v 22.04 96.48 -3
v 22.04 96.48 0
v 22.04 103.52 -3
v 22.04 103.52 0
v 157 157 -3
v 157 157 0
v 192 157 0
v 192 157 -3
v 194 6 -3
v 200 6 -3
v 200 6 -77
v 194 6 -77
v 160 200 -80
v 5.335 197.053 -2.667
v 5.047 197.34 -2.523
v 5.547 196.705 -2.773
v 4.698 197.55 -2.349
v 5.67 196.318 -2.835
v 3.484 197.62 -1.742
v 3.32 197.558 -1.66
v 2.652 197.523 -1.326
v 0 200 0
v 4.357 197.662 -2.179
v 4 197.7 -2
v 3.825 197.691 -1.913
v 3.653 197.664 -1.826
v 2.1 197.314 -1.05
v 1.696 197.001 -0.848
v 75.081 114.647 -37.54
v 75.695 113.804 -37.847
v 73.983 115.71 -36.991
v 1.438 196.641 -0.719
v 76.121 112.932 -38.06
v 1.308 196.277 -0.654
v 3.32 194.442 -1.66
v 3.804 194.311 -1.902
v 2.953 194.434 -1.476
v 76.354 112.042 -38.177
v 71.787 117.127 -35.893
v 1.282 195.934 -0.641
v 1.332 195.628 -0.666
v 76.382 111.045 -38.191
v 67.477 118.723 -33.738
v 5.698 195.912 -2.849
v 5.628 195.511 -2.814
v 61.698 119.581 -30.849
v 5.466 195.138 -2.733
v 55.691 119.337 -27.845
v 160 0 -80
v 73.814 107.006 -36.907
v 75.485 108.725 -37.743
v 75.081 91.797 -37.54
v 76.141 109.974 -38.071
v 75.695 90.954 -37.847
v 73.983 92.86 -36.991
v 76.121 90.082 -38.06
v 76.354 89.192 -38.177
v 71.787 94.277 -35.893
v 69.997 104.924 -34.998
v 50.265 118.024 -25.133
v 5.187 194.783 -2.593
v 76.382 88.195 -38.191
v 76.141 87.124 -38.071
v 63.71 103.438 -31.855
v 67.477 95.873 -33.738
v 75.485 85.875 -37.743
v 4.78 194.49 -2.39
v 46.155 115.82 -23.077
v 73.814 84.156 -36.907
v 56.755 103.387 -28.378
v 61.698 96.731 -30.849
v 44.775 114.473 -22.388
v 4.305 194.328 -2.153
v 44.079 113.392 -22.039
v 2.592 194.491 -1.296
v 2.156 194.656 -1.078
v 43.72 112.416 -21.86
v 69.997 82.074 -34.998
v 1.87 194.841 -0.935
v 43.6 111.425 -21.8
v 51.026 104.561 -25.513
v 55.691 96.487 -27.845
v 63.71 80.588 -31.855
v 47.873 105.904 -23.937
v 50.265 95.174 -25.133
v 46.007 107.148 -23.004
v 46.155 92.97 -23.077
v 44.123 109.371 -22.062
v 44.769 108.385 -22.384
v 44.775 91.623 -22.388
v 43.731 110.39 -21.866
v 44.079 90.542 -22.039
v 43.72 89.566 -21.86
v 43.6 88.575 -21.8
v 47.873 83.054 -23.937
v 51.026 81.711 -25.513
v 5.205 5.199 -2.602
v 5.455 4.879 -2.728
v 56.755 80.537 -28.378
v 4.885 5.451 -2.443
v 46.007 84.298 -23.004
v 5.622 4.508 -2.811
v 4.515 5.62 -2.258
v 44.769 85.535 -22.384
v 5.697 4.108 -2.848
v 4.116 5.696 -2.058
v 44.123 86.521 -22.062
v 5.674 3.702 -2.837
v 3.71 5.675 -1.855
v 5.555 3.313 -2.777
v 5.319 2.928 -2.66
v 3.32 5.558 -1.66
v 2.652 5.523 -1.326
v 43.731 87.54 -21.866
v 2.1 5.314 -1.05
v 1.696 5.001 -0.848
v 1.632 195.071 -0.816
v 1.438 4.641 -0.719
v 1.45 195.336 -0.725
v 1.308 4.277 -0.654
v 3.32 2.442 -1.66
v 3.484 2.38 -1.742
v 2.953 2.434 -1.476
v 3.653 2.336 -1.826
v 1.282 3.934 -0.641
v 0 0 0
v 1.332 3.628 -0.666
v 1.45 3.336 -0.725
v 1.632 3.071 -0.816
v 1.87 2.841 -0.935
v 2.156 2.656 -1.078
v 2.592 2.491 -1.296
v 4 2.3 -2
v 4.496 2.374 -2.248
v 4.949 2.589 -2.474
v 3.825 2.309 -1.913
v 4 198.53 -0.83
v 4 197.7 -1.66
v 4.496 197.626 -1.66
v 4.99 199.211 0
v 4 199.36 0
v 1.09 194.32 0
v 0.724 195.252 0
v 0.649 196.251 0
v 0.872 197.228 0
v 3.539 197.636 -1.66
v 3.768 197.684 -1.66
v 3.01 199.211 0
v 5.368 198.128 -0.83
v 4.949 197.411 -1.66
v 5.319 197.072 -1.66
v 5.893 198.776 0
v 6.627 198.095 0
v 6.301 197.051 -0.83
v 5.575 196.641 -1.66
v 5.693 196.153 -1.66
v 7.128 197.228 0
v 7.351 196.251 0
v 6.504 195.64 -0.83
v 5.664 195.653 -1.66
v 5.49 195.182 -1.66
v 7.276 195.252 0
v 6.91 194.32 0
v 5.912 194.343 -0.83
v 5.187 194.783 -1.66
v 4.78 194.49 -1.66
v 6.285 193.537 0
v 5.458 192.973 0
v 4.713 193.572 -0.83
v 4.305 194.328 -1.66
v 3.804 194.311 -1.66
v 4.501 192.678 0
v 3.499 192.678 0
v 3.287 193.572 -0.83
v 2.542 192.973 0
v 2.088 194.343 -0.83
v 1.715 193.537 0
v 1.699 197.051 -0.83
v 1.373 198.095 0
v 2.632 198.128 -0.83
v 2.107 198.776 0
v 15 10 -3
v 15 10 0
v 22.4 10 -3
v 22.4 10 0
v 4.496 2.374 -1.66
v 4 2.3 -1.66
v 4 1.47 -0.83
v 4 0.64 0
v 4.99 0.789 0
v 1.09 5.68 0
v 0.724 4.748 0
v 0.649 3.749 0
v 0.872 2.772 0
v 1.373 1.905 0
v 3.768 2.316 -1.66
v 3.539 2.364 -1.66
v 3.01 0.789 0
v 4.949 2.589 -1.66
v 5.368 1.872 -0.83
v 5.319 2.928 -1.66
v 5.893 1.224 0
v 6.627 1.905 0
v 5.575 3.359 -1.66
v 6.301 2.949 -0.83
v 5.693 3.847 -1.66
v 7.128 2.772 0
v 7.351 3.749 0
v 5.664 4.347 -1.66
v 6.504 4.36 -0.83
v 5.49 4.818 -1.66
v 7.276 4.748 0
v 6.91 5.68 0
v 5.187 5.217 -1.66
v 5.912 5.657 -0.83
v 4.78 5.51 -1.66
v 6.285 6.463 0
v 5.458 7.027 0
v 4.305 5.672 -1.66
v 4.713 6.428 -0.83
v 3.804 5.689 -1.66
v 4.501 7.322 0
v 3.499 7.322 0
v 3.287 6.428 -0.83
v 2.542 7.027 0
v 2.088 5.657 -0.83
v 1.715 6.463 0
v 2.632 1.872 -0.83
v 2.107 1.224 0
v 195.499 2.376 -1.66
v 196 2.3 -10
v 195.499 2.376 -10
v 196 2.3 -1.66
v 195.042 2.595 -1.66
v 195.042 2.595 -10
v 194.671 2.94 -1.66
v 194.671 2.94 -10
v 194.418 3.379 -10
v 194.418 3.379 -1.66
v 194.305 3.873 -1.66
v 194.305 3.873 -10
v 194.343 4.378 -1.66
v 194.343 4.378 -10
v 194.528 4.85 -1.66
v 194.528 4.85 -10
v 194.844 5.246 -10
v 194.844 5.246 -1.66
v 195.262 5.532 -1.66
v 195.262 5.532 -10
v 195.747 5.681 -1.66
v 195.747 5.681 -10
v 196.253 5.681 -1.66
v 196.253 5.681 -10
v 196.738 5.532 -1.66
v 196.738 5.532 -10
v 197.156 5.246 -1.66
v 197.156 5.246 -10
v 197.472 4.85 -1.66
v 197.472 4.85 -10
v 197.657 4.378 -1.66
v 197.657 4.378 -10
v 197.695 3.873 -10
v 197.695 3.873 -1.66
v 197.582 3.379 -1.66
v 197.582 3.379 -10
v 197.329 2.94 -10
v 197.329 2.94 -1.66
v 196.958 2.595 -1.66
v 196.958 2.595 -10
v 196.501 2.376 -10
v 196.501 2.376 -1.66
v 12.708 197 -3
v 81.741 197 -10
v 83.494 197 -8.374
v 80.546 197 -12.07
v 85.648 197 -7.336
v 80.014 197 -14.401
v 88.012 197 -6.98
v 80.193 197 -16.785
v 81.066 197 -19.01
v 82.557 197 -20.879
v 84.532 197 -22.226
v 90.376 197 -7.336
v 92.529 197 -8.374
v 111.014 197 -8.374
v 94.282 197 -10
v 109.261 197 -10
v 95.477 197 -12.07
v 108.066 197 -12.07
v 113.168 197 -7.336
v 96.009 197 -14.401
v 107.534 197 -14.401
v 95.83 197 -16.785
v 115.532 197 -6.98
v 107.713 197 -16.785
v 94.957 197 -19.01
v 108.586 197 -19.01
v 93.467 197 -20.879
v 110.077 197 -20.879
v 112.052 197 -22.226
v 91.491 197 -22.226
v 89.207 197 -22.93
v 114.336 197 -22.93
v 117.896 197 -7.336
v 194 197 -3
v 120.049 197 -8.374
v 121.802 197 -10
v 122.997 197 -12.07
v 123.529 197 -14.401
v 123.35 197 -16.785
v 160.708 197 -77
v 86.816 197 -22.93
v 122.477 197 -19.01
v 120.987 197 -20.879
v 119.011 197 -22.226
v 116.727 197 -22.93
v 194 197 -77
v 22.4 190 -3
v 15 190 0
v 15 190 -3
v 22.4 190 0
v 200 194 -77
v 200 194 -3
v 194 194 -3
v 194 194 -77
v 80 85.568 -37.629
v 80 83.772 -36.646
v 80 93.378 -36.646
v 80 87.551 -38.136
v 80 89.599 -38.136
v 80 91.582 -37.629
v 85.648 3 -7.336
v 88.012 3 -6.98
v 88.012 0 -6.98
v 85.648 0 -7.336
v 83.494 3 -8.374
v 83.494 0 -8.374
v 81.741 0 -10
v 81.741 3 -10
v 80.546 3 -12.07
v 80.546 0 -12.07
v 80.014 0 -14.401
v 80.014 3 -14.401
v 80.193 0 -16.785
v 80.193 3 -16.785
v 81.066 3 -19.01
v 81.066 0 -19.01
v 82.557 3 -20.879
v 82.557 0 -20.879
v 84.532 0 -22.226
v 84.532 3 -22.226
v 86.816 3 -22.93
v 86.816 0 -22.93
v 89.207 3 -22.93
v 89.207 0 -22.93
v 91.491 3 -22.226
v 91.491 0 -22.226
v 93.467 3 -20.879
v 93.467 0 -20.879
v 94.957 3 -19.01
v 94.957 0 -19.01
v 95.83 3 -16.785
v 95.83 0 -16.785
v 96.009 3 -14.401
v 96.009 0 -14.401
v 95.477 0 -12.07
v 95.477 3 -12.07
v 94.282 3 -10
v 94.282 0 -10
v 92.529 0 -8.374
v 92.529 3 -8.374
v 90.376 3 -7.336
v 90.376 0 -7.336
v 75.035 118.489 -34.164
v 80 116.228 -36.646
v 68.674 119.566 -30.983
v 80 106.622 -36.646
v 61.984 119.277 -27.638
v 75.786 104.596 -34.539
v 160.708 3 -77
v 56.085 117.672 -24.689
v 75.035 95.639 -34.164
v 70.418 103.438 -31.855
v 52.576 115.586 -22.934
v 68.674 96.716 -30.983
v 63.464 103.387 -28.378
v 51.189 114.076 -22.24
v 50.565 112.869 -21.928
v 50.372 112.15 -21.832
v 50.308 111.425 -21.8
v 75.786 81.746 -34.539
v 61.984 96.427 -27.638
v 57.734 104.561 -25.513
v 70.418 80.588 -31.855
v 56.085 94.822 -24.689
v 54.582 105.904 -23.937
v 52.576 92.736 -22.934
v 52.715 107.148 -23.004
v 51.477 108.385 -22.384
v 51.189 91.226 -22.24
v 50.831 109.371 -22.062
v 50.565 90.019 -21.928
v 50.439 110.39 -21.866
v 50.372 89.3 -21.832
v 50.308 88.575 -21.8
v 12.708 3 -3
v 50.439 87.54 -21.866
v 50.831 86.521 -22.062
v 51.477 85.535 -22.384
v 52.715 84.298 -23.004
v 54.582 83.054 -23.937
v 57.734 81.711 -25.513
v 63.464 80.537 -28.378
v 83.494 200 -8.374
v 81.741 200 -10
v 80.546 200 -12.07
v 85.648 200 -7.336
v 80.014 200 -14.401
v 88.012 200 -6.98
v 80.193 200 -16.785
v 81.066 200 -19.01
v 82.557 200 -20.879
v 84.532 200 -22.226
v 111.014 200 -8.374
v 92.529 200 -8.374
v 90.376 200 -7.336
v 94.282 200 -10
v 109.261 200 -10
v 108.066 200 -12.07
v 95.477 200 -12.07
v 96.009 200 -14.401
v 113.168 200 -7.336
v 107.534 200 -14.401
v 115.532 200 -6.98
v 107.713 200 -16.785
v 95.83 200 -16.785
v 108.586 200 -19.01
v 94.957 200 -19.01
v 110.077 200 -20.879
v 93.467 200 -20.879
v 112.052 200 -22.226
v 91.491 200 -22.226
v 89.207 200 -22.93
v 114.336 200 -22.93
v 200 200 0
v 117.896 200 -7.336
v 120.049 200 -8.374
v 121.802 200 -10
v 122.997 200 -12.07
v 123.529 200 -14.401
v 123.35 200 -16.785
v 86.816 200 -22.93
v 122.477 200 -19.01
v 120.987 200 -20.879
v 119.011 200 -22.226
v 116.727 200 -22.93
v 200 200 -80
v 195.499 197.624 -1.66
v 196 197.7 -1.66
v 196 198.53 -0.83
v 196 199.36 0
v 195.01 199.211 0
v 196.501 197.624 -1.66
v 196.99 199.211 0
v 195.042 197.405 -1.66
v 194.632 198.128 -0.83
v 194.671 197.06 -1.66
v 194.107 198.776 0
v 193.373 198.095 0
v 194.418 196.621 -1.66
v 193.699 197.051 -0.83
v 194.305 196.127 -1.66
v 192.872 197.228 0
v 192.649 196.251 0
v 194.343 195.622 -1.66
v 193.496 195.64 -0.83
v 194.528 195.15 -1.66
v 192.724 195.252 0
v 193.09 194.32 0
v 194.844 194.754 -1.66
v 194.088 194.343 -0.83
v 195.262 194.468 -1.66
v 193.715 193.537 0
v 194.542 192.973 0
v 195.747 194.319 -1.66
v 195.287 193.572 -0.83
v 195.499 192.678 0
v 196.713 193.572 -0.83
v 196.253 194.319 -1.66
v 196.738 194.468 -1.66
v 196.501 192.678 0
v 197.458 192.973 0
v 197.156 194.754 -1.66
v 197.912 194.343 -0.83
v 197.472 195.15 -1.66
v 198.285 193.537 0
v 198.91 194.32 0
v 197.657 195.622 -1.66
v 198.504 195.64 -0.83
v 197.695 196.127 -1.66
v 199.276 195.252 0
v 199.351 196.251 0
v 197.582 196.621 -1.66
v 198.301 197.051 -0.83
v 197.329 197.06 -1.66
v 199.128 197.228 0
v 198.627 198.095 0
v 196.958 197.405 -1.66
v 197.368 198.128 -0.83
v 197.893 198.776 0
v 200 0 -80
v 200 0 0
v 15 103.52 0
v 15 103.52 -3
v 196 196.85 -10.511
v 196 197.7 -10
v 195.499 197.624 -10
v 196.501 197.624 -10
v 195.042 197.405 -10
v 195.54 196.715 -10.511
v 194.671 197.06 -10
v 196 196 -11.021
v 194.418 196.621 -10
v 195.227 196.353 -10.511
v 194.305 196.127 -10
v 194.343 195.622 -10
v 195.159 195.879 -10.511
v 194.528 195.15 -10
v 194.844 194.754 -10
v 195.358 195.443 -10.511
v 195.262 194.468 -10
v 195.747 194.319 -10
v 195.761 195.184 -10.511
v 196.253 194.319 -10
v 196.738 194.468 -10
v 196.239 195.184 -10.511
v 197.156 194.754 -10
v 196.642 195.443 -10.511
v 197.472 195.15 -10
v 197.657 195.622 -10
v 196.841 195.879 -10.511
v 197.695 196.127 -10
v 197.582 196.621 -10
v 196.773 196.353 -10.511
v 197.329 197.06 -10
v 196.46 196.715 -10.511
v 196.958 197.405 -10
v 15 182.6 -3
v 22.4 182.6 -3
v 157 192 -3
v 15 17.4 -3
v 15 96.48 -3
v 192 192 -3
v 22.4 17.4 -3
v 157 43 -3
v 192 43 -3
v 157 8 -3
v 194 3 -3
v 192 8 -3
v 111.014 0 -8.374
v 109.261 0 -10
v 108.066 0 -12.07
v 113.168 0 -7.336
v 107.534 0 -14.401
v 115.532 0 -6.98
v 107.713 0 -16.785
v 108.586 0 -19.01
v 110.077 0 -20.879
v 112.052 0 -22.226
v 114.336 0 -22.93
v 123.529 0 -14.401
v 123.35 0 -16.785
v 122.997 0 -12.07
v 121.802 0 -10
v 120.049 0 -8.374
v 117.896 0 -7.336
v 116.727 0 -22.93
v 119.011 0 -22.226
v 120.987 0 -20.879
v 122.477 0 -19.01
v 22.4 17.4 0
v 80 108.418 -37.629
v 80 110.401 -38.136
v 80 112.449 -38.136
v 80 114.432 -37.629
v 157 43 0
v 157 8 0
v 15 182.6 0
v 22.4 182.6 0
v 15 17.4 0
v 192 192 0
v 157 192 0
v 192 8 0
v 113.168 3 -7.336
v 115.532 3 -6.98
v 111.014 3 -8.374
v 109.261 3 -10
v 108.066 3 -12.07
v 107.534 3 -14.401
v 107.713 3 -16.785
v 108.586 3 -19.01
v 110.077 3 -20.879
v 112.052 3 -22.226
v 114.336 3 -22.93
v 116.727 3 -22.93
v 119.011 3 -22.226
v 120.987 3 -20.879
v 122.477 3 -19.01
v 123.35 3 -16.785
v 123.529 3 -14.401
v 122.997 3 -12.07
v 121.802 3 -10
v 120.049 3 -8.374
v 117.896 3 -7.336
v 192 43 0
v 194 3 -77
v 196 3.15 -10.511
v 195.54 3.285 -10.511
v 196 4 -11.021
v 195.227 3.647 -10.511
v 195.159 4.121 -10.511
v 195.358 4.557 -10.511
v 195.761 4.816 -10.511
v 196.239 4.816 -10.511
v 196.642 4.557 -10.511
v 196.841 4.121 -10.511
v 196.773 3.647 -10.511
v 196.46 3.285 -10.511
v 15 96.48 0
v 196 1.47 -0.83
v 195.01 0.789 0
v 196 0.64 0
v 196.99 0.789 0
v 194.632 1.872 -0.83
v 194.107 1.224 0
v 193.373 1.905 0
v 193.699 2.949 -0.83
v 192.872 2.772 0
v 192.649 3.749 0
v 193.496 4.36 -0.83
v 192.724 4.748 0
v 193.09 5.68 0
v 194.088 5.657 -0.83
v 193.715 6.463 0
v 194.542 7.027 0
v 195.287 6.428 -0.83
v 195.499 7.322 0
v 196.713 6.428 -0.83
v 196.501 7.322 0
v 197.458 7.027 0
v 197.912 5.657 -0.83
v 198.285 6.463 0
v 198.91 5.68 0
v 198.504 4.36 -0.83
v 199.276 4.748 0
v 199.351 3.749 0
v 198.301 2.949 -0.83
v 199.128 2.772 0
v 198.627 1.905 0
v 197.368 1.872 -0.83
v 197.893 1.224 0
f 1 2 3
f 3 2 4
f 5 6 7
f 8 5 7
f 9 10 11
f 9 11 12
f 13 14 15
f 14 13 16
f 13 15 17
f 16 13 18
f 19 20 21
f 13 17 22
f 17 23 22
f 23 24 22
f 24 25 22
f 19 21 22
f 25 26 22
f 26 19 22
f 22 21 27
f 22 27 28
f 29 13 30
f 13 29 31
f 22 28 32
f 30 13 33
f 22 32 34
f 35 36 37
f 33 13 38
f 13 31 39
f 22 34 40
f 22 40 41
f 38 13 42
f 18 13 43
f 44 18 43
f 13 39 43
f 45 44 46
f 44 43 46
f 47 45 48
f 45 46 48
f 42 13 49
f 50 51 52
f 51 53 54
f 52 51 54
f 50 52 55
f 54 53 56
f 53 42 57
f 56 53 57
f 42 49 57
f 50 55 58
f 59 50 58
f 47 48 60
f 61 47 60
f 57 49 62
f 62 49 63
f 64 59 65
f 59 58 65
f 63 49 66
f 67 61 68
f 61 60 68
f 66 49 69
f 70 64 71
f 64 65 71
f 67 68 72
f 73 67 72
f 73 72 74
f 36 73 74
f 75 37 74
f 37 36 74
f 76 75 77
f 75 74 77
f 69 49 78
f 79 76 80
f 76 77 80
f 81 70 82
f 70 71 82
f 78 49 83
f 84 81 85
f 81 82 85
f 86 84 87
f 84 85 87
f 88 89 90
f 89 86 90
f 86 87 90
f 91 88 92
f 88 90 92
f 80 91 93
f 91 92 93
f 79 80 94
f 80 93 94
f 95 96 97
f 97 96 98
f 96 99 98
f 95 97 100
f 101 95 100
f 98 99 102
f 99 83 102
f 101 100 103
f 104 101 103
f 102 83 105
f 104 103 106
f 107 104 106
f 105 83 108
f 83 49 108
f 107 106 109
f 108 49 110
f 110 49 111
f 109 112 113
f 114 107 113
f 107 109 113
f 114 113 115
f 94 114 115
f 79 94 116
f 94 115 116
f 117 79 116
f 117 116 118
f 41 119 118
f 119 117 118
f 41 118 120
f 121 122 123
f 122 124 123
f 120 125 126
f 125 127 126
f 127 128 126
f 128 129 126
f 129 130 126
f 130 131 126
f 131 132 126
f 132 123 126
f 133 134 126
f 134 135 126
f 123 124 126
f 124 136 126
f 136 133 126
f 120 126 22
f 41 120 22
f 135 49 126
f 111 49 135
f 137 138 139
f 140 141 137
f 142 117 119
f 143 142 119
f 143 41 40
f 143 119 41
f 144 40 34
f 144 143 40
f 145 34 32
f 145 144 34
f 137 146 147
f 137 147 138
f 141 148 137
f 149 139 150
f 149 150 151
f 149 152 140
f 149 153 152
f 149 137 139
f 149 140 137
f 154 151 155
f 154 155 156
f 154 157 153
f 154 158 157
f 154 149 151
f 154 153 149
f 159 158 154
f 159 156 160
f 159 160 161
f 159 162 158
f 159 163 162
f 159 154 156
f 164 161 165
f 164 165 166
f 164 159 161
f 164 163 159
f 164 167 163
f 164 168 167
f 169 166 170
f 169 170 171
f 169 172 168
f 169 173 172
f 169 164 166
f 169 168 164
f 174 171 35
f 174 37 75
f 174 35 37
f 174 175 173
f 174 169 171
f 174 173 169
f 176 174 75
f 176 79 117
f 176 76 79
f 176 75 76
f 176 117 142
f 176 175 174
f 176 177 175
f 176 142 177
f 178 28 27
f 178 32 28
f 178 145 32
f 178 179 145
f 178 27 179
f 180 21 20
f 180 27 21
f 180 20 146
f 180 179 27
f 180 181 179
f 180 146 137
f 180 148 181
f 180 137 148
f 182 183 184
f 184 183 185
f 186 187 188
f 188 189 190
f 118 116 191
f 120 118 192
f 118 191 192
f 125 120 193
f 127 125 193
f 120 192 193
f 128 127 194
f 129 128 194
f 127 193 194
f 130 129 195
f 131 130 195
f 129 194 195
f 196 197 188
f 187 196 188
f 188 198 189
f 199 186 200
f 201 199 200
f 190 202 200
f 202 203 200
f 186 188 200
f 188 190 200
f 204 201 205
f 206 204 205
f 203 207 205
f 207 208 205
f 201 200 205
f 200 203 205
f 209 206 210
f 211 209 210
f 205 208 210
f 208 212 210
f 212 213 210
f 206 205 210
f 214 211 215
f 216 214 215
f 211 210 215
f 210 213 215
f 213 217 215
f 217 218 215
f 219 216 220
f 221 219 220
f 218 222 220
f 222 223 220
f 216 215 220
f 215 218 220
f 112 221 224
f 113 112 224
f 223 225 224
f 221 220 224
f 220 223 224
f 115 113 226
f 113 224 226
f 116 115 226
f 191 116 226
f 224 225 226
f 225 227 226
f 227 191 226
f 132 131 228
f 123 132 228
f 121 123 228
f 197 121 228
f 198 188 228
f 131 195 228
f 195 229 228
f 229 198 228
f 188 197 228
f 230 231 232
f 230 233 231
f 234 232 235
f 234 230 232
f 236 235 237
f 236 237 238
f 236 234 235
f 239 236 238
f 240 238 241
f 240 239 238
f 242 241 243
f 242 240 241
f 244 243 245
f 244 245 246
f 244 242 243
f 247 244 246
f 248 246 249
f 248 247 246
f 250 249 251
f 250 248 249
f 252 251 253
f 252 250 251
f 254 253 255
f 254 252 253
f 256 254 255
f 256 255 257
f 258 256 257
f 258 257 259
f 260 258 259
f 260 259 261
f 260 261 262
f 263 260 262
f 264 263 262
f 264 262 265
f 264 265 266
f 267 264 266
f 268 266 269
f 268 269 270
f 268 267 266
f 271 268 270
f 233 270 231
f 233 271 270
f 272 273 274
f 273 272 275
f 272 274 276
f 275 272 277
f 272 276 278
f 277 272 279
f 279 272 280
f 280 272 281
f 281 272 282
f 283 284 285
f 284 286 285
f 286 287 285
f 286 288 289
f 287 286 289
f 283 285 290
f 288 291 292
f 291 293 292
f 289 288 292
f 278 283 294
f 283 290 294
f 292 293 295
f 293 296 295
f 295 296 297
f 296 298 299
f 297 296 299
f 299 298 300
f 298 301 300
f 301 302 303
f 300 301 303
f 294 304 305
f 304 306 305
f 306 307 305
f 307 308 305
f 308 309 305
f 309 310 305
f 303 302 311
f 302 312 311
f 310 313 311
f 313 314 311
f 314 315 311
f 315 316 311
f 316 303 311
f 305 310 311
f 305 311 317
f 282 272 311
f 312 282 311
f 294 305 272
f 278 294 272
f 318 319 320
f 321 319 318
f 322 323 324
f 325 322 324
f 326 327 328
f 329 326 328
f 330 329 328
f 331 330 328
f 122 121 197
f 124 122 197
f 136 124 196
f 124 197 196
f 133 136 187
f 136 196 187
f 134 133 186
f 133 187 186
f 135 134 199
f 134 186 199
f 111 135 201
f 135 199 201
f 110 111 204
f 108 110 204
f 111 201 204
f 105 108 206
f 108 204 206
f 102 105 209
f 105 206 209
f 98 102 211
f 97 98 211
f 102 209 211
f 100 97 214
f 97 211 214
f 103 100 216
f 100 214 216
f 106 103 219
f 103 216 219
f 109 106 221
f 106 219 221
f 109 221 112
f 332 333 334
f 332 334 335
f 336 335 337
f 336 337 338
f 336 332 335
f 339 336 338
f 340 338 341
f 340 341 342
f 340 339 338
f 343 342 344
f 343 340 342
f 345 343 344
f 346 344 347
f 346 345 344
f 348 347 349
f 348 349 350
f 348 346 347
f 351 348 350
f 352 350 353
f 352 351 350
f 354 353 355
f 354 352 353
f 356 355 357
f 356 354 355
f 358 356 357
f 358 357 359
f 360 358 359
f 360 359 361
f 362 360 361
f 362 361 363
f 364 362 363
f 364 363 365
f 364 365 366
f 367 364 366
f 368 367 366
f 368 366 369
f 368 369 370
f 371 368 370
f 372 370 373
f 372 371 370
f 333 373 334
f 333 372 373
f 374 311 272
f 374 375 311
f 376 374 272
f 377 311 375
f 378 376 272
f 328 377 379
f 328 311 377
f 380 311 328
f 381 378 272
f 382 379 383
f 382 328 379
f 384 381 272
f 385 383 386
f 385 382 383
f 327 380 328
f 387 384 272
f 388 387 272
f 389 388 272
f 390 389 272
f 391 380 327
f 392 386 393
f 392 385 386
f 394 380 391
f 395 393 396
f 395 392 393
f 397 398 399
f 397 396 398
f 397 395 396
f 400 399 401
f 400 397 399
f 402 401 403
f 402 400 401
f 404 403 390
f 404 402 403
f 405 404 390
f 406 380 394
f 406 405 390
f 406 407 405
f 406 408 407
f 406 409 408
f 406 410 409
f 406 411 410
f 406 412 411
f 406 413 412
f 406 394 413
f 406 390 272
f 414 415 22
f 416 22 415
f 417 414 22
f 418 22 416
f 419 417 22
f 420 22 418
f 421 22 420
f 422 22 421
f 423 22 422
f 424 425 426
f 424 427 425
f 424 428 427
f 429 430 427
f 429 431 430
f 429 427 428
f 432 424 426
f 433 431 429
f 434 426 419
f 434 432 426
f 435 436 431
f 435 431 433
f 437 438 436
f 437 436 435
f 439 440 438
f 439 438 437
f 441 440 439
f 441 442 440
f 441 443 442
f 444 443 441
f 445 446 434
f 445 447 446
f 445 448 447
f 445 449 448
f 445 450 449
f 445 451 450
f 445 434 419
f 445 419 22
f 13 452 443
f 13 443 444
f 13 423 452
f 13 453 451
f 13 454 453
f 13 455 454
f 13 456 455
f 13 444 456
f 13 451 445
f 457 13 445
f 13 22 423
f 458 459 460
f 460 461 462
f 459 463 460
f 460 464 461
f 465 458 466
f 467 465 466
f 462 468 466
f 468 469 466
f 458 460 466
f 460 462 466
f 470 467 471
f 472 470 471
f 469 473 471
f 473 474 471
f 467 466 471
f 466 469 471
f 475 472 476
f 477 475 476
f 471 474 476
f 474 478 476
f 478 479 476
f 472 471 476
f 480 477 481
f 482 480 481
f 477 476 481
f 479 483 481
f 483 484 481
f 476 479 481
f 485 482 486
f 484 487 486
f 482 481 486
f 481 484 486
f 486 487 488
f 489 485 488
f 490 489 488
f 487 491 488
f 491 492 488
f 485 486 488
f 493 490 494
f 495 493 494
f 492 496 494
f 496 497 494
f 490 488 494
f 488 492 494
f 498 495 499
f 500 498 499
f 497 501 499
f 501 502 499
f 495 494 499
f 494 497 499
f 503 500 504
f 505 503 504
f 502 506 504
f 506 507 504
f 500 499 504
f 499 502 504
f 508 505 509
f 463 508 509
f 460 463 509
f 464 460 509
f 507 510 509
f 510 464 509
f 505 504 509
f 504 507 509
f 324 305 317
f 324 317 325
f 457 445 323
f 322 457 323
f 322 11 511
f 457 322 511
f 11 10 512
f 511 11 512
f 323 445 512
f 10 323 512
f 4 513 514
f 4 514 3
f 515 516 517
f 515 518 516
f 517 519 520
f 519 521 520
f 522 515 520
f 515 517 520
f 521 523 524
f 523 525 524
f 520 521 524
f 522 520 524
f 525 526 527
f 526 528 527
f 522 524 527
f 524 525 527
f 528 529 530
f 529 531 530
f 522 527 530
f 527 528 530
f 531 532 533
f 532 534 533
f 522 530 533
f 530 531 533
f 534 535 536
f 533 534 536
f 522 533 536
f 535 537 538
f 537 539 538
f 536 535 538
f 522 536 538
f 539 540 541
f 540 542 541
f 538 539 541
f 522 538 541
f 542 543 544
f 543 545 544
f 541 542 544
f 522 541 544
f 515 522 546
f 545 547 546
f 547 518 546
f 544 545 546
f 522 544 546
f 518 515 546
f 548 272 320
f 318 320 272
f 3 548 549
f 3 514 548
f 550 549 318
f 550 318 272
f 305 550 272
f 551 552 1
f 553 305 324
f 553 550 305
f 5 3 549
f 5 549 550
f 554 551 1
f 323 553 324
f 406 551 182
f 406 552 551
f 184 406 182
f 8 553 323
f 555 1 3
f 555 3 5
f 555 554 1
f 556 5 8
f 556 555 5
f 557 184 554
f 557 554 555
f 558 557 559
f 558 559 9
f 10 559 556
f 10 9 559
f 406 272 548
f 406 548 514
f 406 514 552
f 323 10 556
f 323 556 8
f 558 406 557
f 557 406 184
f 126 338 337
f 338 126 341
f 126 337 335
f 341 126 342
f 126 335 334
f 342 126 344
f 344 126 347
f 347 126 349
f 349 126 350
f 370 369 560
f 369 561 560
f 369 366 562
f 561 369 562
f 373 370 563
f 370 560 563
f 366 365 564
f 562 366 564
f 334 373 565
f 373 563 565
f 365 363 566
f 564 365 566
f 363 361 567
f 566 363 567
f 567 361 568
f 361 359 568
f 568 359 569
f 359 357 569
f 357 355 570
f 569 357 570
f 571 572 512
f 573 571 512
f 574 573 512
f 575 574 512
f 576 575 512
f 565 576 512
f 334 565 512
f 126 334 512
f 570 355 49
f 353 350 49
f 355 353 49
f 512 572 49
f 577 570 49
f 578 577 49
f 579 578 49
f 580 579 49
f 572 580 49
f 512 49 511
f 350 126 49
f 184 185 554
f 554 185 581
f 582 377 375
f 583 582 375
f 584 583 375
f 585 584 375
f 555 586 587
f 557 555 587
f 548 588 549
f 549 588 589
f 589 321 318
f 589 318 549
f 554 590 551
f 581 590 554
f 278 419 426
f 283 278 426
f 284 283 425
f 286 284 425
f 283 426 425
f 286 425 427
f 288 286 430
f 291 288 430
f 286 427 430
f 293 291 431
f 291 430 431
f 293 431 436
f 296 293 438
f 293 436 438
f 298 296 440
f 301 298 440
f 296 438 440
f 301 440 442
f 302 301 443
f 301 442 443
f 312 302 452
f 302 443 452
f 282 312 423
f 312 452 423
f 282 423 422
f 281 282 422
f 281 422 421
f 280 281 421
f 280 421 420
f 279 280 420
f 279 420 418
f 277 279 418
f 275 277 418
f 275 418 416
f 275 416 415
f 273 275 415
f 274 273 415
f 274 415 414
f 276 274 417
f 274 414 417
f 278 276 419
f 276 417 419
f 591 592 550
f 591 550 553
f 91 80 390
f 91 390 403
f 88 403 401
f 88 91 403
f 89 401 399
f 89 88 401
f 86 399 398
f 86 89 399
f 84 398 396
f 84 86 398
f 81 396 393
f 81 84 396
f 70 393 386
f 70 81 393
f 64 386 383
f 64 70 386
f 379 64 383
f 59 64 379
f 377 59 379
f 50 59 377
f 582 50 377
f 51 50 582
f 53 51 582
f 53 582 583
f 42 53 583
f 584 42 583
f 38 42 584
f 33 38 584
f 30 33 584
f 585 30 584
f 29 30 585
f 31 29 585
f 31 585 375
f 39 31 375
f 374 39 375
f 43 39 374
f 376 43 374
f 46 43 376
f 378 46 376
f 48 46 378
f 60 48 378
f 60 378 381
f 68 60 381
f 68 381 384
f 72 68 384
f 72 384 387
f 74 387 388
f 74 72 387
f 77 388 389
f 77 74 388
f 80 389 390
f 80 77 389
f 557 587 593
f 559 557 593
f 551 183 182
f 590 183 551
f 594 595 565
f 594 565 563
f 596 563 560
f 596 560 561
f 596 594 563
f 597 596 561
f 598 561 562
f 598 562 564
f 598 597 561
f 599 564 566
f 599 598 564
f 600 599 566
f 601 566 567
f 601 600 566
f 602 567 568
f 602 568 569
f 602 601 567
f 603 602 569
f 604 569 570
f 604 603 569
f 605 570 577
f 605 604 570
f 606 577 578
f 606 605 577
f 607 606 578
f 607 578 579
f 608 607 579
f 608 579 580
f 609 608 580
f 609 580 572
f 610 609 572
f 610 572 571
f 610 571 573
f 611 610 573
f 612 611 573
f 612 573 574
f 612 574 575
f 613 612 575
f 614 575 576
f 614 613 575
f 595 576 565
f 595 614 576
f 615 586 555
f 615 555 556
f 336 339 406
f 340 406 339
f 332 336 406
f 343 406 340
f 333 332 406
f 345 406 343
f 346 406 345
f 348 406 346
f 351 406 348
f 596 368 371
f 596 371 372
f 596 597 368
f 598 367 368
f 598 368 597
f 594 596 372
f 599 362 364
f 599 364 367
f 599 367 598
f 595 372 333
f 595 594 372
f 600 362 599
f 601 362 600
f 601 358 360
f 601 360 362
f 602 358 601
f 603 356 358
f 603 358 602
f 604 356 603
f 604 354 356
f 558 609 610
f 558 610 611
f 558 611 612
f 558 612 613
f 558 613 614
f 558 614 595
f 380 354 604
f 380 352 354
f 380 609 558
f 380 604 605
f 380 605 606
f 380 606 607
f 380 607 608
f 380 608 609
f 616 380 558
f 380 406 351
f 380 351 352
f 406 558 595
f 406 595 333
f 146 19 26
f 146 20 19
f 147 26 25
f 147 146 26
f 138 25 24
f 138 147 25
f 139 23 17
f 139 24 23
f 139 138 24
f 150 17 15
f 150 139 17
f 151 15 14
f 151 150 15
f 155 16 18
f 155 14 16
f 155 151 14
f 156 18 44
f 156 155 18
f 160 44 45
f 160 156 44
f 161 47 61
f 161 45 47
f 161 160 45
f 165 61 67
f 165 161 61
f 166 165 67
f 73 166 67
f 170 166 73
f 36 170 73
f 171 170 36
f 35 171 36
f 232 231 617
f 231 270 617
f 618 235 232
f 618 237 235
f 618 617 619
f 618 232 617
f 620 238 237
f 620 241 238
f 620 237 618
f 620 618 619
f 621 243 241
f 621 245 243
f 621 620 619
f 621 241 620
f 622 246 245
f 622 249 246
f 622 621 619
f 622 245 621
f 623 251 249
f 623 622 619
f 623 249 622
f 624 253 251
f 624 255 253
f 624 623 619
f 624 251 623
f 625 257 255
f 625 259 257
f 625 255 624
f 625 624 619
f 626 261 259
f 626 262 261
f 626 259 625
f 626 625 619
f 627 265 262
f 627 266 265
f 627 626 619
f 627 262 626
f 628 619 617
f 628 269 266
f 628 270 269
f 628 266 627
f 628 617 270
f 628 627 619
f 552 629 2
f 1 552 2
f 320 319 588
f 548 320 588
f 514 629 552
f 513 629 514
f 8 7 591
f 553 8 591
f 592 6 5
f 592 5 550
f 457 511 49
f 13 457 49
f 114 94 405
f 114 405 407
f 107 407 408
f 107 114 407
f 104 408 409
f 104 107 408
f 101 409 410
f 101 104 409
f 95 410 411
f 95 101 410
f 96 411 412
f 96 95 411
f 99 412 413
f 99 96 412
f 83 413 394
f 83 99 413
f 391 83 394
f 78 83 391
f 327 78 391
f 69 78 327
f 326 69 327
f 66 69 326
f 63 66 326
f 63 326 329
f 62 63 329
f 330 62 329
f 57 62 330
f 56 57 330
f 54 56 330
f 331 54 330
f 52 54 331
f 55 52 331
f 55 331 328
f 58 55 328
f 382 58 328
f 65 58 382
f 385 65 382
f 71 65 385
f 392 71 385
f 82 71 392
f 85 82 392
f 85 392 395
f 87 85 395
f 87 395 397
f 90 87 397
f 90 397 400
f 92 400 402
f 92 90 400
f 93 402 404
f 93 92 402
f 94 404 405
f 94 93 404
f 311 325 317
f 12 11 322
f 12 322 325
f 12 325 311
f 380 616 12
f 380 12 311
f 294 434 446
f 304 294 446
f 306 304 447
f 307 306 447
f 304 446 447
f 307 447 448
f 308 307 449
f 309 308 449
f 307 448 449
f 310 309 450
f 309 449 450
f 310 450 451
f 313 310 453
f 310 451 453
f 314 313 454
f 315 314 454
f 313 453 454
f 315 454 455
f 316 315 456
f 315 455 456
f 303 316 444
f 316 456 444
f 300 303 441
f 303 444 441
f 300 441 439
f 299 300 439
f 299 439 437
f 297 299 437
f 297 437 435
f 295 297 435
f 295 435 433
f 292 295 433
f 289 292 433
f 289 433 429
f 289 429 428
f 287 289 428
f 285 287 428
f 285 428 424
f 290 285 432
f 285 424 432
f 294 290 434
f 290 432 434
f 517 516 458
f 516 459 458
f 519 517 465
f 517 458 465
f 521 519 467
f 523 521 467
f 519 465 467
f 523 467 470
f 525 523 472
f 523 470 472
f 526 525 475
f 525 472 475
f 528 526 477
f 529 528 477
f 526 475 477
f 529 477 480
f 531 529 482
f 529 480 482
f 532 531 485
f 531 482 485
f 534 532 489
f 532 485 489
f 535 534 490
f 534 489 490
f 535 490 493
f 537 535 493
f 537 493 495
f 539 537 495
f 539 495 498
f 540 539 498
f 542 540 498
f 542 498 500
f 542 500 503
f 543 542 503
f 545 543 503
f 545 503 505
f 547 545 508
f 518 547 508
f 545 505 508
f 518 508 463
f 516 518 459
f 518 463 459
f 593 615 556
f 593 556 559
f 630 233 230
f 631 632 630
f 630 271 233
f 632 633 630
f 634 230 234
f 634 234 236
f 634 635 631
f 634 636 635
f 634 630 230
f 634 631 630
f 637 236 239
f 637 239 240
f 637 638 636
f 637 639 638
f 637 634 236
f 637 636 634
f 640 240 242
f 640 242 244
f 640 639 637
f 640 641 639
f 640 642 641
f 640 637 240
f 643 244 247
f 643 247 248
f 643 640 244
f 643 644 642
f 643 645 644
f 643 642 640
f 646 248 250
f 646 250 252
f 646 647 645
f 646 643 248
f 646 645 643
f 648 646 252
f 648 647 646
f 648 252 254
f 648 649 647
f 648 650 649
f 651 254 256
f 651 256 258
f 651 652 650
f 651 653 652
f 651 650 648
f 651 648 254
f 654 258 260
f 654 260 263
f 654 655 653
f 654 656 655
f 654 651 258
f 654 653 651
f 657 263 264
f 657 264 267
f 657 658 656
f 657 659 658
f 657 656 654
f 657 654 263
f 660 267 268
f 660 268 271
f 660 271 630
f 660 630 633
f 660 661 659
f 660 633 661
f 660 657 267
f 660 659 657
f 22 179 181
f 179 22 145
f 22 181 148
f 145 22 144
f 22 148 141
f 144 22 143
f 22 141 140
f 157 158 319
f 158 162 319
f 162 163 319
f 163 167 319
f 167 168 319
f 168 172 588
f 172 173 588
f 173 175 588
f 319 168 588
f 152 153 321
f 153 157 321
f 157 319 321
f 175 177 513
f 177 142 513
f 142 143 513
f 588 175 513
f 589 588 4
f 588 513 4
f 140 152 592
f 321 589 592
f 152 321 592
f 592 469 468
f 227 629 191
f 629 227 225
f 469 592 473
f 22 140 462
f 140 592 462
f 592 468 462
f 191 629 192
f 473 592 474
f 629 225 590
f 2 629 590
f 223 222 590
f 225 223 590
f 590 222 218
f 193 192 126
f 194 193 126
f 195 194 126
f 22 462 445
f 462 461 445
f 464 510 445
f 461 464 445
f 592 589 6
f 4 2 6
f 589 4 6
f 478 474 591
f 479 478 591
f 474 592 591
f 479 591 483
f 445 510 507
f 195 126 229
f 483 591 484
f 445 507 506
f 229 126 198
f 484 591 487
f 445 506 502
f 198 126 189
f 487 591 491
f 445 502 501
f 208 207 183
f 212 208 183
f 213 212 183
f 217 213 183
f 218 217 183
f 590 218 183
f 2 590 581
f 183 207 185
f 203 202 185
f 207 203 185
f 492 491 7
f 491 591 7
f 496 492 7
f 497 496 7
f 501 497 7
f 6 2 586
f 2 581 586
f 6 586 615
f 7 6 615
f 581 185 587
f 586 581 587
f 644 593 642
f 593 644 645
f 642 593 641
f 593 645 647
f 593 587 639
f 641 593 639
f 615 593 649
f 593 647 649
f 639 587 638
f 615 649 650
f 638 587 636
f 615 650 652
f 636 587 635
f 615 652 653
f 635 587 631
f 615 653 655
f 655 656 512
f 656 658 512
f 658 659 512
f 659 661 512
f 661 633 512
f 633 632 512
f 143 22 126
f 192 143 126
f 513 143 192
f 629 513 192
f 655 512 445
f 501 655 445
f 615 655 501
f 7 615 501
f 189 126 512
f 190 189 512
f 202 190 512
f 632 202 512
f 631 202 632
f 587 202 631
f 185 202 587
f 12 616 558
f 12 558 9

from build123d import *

# Parameters (mm, degrees)
SALIENTE_EXTRUIR2_DEPTH = 200
VACIADO2_T              = -3
CROQUIS6_R              = 8.2
CORTAR_EXTRUIR4_DEPTH   = 80
CROQUIS2_R              = 8.02
CORTAR_EXTRUIR5_DEPTH   = 3
CORTAR_EXTRUIR6_START   = -3
CROQUIS5_R              = 8.02
CORTAR_EXTRUIR6_DEPTH   = 3
CROQUIS7_W              = 7.4
CROQUIS7_H              = 7.4
CORTAR_EXTRUIR11_DEPTH  = 3
CROQUIS8_W              = 7.04
CROQUIS8_H              = 7.04
CORTAR_EXTRUIR12_DEPTH  = 3
CROQUIS9_W              = 35
CROQUIS9_H              = 35
CORTAR_EXTRUIR13_DEPTH  = 3
CROQUIS15_W             = 6
CROQUIS15_H             = 3
SALIENTE_EXTRUIR3_DEPTH = 75


with BuildPart() as part:
    # Croquis1 → Saliente-Extruir2 (new body)
    with BuildSketch(Plane(origin=(0, 0, 0), x_dir=(1, 0, 0), z_dir=(0, 1, 0))):
        Polygon((0, 0), (200, 0), (200, 80), (160, 80), align=None)
    extrude(amount=SALIENTE_EXTRUIR2_DEPTH)

    # Vaciado2
    vaciado2_openings = [part.faces().sort_by_distance(p)[0] for p in [
        (200, 100, -40),
    ]]
    offset(amount=VACIADO2_T, openings=vaciado2_openings, kind=Kind.INTERSECTION)

    # Croquis6 → Cortar-Extruir4 (cut)
    with BuildSketch(Plane(origin=(0, 0, 0), x_dir=(0, 0, -1), z_dir=(1, 0, 0))):
        with Locations(Location((30, 88.575, 0), (0, 0, 180))):
            Circle(CROQUIS6_R)
        with Locations(Location((30, 111.425, 0), (0, 0, 180))):
            Circle(CROQUIS6_R)
    extrude(amount=CORTAR_EXTRUIR4_DEPTH, mode=Mode.SUBTRACT)

    # Croquis2 → Cortar-Extruir5 (cut)
    with BuildSketch(Plane(origin=(0, 200, 0), x_dir=(1, 0, 0), z_dir=(0, 1, 0))):
        with Locations(Location((88.011571484, 15, 0), (0, 0, 270))):
            Circle(CROQUIS2_R)
        with Locations(Location((115.531571484, 15, 0), (0, 0, 270))):
            Circle(CROQUIS2_R)
    extrude(amount=-CORTAR_EXTRUIR5_DEPTH, mode=Mode.SUBTRACT)

    # Croquis5 → Cortar-Extruir6 (cut)
    with BuildSketch(Plane.XZ.offset(CORTAR_EXTRUIR6_START)):
        with Locations(Location((88.011571484, -15, 0), (0, 0, 90))):
            Circle(CROQUIS5_R)
        with Locations(Location((115.531571484, -15, 0), (0, 0, 90))):
            Circle(CROQUIS5_R)
    extrude(amount=CORTAR_EXTRUIR6_DEPTH, mode=Mode.SUBTRACT)

    # Croquis7 → Cortar-Extruir11 (cut)
    with BuildSketch(Plane.XY):
        with Locations((18.7, 13.7)):
            Rectangle(CROQUIS7_W, CROQUIS7_H)
    cortar_extruir11 = extrude(amount=-CORTAR_EXTRUIR11_DEPTH, mode=Mode.SUBTRACT)

    # Simetría5: Cortar-Extruir11 across plane
    add(cortar_extruir11.mirror(Plane.ZX.offset(100)), mode=Mode.SUBTRACT)

    # Croquis8 → Cortar-Extruir12 (cut)
    with BuildSketch(Plane.XY):
        with Locations((18.52, 100)):
            Rectangle(CROQUIS8_W, CROQUIS8_H)
    extrude(amount=-CORTAR_EXTRUIR12_DEPTH, mode=Mode.SUBTRACT)

    # Croquis9 → Cortar-Extruir13 (cut)
    with BuildSketch(Plane.XY):
        with Locations((174.5, 174.5)):
            Rectangle(CROQUIS9_W, CROQUIS9_H)
    cortar_extruir13 = extrude(amount=-CORTAR_EXTRUIR13_DEPTH, mode=Mode.SUBTRACT)

    # Simetría6: Cortar-Extruir13 across plane
    add(cortar_extruir13.mirror(Plane.ZX.offset(100)), mode=Mode.SUBTRACT)

    # Croquis15 → Saliente-Extruir3 (add)
    with BuildSketch(Plane(origin=(0, 0, -3), x_dir=(-1, 0, 0), z_dir=(0, 0, -1))):
        with Locations((-197, 4.5)):
            Rectangle(CROQUIS15_W, CROQUIS15_H)
    saliente_extruir3 = extrude(amount=SALIENTE_EXTRUIR3_DEPTH)

    # Simetría7: Saliente-Extruir3 across plane
    add(saliente_extruir3.mirror(Plane.ZX.offset(100)))

    # Croquis18 → Refrentado para tornillo tapón con cabeza plana de clavija de M33 (revolve, cut)
    with BuildSketch(Plane(origin=(196, 4, 0), x_dir=(0, -1, 0), z_dir=(1, 0, 0))):
        Polygon((0, 0), (0, 11.021463052), (1.7, 10), (1.7, 1.66), (3.36, 0), align=None)
    refrentado_para_tornillo_tap_n_con_cabez = revolve(axis=Axis((196, 4, 6.35), (0, 0, -1)), mode=Mode.SUBTRACT)

    # Simetría8: Refrentado para tornillo tapón con cabeza plana de clavija de M33 across plane
    add(refrentado_para_tornillo_tap_n_con_cabez.mirror(Plane.ZX.offset(100)), mode=Mode.SUBTRACT)

    # Simetría9: Refrentado para tornillo tapón con cabeza plana de clavija de M33 across plane
    add(refrentado_para_tornillo_tap_n_con_cabez.mirror(Plane(origin=(100, 0, 0), x_dir=(0, 0, 1), z_dir=(1, 0, 0))), mode=Mode.SUBTRACT)

    # Simetría9 copy 1 sketch → Simetría9 copy 1 (revolve, cut)
    with BuildSketch(Plane(origin=(4, 196, 0), x_dir=(0, 1, 0), z_dir=(-1, 0, 0))):
        Polygon((0, 0), (0, 11.021463052), (1.7, 10), (1.7, 1.66), (3.36, 0), align=None)
    revolve(axis=Axis((4, 196, 6.35), (0, 0, -1)), mode=Mode.SUBTRACT)


solid = part.part
